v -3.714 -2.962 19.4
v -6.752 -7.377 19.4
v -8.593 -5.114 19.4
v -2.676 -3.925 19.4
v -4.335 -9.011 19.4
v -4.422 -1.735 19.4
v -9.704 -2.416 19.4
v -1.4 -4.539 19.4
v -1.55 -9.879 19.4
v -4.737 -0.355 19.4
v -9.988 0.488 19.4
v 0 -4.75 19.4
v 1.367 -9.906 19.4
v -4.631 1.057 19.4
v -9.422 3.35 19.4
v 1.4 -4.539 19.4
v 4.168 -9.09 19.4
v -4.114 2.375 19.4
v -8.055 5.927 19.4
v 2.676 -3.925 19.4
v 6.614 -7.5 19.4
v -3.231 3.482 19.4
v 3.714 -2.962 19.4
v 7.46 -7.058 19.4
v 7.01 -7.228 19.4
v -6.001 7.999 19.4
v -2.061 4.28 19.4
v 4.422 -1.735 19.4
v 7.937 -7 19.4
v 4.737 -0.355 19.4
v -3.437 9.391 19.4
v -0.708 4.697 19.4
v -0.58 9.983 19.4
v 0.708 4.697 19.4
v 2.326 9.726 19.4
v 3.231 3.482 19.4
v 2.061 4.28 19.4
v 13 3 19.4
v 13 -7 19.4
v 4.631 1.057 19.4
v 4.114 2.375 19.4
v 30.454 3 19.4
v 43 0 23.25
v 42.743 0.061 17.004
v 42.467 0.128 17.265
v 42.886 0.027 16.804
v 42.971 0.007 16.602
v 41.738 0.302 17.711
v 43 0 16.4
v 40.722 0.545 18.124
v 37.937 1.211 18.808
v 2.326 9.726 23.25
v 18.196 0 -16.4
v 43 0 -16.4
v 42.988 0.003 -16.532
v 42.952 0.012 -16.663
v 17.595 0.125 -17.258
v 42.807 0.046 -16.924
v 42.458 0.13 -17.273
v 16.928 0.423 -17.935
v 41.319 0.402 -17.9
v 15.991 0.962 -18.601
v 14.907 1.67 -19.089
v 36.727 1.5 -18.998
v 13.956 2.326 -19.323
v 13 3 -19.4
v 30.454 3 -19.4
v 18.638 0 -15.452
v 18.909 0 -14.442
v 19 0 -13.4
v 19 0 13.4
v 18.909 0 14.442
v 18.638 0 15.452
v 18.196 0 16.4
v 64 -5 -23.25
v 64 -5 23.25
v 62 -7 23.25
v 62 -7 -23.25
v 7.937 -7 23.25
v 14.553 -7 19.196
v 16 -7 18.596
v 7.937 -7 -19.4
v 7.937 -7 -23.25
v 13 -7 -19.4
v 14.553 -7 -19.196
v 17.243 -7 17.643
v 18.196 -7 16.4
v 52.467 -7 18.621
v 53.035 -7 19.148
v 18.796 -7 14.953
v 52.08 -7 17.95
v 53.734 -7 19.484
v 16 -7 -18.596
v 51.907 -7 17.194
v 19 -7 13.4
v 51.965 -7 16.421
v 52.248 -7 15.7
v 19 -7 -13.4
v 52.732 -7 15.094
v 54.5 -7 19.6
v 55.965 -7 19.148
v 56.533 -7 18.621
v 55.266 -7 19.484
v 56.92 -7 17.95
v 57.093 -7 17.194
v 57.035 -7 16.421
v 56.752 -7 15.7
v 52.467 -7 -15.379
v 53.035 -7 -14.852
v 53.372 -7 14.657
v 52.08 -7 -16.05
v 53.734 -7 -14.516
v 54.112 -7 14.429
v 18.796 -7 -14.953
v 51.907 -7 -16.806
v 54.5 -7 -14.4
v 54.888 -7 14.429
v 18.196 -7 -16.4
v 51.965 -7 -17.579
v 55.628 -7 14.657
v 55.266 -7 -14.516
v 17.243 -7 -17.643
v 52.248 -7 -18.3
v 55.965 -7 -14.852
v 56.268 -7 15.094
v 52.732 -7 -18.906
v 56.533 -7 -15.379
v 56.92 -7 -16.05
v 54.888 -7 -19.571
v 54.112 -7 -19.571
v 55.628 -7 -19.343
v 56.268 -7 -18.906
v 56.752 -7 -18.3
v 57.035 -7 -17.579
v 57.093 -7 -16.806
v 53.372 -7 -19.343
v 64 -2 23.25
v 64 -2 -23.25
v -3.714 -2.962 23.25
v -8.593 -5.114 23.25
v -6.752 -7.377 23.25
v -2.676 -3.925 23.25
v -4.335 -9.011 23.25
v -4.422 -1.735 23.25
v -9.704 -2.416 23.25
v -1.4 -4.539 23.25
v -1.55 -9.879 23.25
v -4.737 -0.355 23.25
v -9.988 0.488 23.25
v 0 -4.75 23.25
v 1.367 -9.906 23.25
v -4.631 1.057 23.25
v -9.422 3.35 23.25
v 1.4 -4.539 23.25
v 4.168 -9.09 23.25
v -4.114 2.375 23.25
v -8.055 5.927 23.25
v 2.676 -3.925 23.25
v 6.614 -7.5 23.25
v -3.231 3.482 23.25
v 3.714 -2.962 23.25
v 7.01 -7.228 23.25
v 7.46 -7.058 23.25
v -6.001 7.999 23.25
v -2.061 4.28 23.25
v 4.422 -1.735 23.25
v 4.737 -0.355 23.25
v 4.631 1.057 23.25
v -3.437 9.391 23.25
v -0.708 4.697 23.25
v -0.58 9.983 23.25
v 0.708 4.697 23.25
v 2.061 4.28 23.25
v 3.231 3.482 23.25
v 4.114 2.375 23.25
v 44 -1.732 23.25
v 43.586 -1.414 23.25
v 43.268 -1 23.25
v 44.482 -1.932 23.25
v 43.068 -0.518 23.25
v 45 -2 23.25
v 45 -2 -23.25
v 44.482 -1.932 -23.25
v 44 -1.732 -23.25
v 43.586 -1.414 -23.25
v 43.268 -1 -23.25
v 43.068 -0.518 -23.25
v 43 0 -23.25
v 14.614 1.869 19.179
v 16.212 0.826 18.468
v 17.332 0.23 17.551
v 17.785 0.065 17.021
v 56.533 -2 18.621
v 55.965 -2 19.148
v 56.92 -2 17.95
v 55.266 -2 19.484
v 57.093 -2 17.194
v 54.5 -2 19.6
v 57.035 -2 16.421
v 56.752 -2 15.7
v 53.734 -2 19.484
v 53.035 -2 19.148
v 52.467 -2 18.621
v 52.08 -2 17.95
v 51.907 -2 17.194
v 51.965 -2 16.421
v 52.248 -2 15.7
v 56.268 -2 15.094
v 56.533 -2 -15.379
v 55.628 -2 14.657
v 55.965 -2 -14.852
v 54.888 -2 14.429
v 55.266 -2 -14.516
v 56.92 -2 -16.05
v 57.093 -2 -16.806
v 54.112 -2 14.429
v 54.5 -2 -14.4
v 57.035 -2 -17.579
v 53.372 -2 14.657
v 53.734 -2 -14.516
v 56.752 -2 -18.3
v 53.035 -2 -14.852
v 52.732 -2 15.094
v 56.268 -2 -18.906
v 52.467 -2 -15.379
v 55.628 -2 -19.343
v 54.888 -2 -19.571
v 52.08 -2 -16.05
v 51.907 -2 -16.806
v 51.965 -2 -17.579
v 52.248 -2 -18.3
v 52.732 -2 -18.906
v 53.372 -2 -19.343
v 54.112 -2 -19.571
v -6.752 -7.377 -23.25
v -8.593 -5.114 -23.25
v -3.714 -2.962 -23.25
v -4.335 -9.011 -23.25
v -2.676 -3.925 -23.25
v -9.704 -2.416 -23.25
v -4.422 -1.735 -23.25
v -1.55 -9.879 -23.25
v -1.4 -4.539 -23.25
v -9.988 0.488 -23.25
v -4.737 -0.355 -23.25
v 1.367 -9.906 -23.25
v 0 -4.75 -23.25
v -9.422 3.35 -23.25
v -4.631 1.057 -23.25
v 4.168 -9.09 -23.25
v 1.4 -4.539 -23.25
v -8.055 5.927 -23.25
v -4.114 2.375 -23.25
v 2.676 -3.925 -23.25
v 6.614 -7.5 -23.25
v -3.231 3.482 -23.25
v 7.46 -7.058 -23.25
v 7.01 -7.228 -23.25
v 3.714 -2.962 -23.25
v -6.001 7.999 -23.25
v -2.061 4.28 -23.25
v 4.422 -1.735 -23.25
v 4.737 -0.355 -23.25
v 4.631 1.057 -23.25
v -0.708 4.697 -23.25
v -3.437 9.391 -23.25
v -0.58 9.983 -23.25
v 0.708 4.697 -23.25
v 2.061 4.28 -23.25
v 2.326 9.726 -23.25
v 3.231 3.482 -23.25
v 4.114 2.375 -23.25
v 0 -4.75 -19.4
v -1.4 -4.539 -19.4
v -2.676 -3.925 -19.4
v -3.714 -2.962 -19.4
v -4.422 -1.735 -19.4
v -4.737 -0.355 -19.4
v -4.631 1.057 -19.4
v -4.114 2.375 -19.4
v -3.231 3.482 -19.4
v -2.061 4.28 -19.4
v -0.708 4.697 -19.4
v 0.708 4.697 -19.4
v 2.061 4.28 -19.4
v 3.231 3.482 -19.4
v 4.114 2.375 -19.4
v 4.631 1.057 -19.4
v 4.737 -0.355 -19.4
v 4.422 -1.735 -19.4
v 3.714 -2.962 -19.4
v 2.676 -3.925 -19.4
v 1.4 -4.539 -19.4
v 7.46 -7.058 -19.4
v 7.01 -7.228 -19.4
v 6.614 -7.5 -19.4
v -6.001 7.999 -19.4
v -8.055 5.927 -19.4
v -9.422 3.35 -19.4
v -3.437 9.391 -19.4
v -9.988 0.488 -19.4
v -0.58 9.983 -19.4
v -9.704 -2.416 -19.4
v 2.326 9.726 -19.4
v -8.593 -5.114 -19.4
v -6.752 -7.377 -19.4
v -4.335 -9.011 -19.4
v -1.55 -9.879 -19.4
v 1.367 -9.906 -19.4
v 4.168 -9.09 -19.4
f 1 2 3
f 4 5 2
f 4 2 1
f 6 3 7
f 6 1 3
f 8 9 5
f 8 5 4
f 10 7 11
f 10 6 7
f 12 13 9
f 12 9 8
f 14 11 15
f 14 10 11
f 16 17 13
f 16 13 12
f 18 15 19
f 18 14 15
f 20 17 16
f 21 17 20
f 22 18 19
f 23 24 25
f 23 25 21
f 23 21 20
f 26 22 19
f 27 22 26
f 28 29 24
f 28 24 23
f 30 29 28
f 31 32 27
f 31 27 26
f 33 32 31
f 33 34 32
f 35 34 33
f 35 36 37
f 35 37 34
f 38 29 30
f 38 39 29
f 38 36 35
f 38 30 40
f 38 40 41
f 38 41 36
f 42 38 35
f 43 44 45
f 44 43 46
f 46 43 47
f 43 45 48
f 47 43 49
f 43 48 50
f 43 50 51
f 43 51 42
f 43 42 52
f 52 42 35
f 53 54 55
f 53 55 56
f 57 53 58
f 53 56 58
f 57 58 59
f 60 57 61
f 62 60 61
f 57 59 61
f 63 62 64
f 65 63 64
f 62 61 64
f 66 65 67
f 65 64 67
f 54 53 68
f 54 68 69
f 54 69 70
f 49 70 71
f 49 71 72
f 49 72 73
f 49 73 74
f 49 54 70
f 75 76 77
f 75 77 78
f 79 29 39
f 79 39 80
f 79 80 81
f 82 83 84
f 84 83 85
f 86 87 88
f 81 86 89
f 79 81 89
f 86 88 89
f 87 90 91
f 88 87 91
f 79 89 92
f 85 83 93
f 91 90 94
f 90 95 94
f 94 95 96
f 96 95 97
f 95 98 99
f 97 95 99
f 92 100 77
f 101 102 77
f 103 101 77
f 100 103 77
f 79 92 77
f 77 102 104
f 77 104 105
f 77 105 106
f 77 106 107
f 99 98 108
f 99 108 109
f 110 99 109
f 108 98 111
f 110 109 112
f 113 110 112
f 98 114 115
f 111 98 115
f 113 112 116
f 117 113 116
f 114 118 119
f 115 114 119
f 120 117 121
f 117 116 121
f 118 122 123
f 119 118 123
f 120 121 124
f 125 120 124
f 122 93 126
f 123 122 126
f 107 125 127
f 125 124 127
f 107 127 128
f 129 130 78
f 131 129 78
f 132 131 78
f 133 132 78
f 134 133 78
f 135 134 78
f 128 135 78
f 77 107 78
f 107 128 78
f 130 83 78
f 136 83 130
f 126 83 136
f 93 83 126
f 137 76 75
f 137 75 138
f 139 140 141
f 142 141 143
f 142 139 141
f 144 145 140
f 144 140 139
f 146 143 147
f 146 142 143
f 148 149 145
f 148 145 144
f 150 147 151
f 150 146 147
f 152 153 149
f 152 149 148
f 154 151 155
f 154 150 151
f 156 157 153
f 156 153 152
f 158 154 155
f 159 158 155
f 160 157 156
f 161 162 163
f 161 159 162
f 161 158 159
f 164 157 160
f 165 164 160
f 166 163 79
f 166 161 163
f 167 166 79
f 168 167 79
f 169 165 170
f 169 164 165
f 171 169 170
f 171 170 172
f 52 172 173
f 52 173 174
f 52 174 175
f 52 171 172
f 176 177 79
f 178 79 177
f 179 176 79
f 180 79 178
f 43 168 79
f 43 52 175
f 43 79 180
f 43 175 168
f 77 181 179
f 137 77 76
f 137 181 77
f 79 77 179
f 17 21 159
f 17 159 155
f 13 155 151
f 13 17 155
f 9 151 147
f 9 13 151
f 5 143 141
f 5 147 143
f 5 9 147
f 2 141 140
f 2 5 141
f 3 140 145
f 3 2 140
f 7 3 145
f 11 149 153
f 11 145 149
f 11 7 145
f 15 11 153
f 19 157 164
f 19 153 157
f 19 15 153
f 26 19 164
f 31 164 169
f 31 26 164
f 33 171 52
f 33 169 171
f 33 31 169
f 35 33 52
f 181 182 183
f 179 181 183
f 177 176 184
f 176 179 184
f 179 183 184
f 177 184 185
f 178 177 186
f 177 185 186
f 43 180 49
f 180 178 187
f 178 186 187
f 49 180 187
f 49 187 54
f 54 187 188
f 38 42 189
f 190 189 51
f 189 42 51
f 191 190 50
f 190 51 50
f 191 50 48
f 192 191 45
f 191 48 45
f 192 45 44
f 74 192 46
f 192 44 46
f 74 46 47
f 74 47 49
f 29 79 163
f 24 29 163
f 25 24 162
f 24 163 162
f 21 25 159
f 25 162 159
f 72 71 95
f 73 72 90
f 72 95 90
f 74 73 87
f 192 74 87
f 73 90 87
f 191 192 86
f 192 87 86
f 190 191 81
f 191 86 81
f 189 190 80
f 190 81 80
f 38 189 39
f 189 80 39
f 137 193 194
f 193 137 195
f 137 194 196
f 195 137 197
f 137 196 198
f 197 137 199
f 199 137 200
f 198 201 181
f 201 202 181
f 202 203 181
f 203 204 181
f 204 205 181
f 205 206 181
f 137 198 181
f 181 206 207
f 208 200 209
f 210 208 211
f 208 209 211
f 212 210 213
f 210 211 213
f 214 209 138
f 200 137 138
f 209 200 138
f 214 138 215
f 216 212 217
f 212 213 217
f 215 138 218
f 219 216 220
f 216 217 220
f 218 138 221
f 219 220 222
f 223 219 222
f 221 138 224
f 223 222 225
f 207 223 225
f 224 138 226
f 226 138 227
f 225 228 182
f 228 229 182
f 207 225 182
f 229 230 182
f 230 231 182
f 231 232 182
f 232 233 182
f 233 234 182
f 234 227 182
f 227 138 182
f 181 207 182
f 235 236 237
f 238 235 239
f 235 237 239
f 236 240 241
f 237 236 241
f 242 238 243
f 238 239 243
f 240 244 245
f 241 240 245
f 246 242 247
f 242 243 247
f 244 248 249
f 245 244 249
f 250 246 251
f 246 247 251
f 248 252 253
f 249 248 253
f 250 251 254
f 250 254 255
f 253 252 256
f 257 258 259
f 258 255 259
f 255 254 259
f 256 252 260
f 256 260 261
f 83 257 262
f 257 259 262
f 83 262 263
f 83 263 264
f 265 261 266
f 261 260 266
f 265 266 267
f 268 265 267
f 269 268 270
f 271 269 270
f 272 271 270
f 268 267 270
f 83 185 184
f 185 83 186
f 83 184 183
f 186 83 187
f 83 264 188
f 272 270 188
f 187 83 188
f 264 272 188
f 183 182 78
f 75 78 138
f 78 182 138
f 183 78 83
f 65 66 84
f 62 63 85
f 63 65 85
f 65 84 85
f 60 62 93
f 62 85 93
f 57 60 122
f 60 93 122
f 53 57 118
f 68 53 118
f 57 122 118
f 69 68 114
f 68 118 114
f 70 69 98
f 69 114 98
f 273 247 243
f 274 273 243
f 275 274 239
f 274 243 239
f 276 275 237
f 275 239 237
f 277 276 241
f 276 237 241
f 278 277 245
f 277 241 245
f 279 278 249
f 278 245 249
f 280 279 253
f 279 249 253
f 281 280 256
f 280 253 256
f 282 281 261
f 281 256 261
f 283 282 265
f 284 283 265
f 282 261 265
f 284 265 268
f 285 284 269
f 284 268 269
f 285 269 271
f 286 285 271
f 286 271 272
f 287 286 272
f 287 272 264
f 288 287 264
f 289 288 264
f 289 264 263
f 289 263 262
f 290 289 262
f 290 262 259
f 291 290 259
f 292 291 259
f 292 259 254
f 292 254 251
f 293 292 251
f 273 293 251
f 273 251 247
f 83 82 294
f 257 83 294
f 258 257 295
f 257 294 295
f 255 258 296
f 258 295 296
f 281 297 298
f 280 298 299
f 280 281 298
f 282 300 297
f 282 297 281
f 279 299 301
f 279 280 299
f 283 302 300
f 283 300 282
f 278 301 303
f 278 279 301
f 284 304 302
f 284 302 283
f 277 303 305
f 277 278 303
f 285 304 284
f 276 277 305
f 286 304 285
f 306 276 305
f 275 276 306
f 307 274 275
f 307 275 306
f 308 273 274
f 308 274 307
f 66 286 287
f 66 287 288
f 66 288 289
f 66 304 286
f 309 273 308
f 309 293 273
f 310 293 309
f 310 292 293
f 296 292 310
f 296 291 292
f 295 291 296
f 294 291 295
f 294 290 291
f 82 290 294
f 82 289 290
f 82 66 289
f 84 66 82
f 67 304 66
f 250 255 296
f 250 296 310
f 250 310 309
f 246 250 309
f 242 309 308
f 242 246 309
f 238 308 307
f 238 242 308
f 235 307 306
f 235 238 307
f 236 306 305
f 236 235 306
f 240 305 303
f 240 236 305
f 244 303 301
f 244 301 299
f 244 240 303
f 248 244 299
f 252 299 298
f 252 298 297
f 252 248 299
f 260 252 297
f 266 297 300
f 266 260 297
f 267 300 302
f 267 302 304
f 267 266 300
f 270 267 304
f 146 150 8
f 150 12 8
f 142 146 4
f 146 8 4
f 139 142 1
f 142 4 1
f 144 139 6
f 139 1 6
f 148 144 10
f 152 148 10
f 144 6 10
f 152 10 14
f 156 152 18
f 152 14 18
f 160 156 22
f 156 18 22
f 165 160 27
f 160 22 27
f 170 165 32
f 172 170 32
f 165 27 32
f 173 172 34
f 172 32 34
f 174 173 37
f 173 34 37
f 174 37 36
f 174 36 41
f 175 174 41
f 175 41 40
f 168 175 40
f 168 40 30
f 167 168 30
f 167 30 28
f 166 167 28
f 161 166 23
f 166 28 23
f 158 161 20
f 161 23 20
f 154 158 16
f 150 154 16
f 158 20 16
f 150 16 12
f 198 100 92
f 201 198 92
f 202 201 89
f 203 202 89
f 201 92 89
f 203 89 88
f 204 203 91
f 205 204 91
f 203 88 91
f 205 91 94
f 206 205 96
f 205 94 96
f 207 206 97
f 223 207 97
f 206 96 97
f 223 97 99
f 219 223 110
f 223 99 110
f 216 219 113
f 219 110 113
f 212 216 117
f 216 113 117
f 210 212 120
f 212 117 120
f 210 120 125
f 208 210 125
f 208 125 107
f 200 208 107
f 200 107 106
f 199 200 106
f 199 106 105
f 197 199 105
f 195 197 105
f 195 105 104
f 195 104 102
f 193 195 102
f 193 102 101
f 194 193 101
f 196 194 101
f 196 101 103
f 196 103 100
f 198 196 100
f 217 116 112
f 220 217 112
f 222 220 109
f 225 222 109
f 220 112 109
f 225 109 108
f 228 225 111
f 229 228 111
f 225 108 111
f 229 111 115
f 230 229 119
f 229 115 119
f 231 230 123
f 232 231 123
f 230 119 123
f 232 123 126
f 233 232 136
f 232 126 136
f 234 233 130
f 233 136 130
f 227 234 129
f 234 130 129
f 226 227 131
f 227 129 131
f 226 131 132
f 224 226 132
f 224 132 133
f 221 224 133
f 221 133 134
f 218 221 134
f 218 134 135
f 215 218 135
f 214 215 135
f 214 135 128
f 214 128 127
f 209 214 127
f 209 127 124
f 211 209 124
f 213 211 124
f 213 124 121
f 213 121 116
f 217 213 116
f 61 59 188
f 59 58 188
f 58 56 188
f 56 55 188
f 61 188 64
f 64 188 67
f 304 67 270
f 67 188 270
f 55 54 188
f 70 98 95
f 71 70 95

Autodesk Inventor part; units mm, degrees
ref_plane "YZ Plane" through (0, 0, 0) normal (1, 0, 0) x (0, 1, 0)
ref_plane "XZ Plane" through (0, 0, 0) normal (0, 1, 0) x (-1, 0, 0)
ref_plane "XY Plane" through (0, 0, 0) normal (0, 0, 1) x (1, 0, 0)
sketch "Sketch1" plane through (0, 0, 0) normal (0, 0, 1) x (1, 0, 0)
  arc A0 (2.3256, 9.7258) -> (7.1414, -7) centre (0, 0) ccw
  line L0 (7.1414, -7) -> (64, -7)
  line L1 (64, -7) -> (64, -2)
  line L2 (64, -2) -> (45, -2)
  arc A1 (43, 0) -> (45, -2) centre (45, 0) ccw
  line L3 (43, 0) -> (2.3256, 9.7258)
  dimension "d0" = 20
  dimension "d1" = 21
  dimension "d2" = 64
  dimension "d3" = 5
  dimension "d4" = 2
  dimension "d5" = 7
extrude "Extrusion1" add sketch "Sketch1" along normal mid plane 46.5
sketch "Sketch2" plane through (0, 0, 23.25) normal (0, 0, 1) x (1, 0, 0)
  arc A0 (2.3256, 9.7258) -> (7.1414, -7) centre (0, 0) ccw projected
hole "Hole1" at (0, 0, 23.25) direction (0, 0, -1) diameter 9.5 depth 46.5
sketch "Sketch4" plane through (64, -7, 23.25) normal (1, 0, 0) x (0, 0, -1)
  line L0 (46.5, 17) -> (0, 17) projected
  line L1 (46.5, 7) -> (0, 7) projected
  line L2 (3.85, 17) -> (42.65, 17)
  line L3 (42.65, 17) -> (42.65, 10)
  line L4 (39.65, 7) -> (6.85, 7)
  line L5 (3.85, 10) -> (3.85, 17)
  arc A0 (3.85, 10) -> (6.85, 7) centre (6.85, 10) ccw
  arc A1 (39.65, 7) -> (42.65, 10) centre (39.65, 10) ccw
  point P0 (23.25, 7)
  point P1 (23.25, 7)
  dimension "d20" = 38.8
  dimension "d21" = 3
extrude "Extrusion3" cut sketch "Sketch4" against normal up to next
sketch "Sketch6" plane through (0, 0, 0) normal (0, 1, 0) x (-1, 0, 0)
  line L0 (10, 16.4) -> (10, -16.4) projected
  line L1 (-2.3256, -19.4) -> (-30.4537, -19.4) projected
  line L2 (-30.4537, 19.4) -> (-2.3256, 19.4) projected
  line L3 (10, -19.4) -> (-13, -19.4)
  line L4 (-19, -13.4) -> (-19, 13.4)
  line L5 (-13, 19.4) -> (10, 19.4)
  line L6 (10, 19.4) -> (10, -19.4)
  arc A0 (-19, -13.4) -> (-13, -19.4) centre (-13, -13.4) ccw
  arc A1 (-13, 19.4) -> (-19, 13.4) centre (-13, 13.4) ccw
  point P0 (0, 0)
  point P1 (-19, -19.4)
  point P2 (10, 0)
  point P3 (-13, -19.4)
  point P4 (-2.3256, 19.4)
  point P5 (-13, 19.4)
  dimension "d24" = 38.8
  dimension "d26" = 6
  dimension "d29" = 19
extrude "Extrusion4" cut sketch "Sketch6" along normal through all both and the other way through all
sketch "Sketch7" plane through (45, -2, 23.25) normal (0, 1, 0) x (1, 0, 0)
  line L0 (19, 46.5) -> (19, 0) projected
  line L1 (9.5, 40.25) -> (9.5, 6.25) construction
  line L2 (19, 46.5) -> (19, 0) construction
  point P0 (-45, 23.25)
  point P1 (9.5, 23.25)
  dimension "d31" = 34
  dimension "d33" = 9.5
hole "Hole2" at (54.5, -2, 17) at (54.5, -2, -17) direction (0, -1, 0) diameter 5.2 end through all
chamfer "Chamfer1" distance 2 angle 45 1 edges at (64, -7, 0)
fillet "Fillet1" radius 2 2 edges at (7.1414, -7, 21.325) (7.1414, -7, -21.325)
properties material "Stainless Steel"
